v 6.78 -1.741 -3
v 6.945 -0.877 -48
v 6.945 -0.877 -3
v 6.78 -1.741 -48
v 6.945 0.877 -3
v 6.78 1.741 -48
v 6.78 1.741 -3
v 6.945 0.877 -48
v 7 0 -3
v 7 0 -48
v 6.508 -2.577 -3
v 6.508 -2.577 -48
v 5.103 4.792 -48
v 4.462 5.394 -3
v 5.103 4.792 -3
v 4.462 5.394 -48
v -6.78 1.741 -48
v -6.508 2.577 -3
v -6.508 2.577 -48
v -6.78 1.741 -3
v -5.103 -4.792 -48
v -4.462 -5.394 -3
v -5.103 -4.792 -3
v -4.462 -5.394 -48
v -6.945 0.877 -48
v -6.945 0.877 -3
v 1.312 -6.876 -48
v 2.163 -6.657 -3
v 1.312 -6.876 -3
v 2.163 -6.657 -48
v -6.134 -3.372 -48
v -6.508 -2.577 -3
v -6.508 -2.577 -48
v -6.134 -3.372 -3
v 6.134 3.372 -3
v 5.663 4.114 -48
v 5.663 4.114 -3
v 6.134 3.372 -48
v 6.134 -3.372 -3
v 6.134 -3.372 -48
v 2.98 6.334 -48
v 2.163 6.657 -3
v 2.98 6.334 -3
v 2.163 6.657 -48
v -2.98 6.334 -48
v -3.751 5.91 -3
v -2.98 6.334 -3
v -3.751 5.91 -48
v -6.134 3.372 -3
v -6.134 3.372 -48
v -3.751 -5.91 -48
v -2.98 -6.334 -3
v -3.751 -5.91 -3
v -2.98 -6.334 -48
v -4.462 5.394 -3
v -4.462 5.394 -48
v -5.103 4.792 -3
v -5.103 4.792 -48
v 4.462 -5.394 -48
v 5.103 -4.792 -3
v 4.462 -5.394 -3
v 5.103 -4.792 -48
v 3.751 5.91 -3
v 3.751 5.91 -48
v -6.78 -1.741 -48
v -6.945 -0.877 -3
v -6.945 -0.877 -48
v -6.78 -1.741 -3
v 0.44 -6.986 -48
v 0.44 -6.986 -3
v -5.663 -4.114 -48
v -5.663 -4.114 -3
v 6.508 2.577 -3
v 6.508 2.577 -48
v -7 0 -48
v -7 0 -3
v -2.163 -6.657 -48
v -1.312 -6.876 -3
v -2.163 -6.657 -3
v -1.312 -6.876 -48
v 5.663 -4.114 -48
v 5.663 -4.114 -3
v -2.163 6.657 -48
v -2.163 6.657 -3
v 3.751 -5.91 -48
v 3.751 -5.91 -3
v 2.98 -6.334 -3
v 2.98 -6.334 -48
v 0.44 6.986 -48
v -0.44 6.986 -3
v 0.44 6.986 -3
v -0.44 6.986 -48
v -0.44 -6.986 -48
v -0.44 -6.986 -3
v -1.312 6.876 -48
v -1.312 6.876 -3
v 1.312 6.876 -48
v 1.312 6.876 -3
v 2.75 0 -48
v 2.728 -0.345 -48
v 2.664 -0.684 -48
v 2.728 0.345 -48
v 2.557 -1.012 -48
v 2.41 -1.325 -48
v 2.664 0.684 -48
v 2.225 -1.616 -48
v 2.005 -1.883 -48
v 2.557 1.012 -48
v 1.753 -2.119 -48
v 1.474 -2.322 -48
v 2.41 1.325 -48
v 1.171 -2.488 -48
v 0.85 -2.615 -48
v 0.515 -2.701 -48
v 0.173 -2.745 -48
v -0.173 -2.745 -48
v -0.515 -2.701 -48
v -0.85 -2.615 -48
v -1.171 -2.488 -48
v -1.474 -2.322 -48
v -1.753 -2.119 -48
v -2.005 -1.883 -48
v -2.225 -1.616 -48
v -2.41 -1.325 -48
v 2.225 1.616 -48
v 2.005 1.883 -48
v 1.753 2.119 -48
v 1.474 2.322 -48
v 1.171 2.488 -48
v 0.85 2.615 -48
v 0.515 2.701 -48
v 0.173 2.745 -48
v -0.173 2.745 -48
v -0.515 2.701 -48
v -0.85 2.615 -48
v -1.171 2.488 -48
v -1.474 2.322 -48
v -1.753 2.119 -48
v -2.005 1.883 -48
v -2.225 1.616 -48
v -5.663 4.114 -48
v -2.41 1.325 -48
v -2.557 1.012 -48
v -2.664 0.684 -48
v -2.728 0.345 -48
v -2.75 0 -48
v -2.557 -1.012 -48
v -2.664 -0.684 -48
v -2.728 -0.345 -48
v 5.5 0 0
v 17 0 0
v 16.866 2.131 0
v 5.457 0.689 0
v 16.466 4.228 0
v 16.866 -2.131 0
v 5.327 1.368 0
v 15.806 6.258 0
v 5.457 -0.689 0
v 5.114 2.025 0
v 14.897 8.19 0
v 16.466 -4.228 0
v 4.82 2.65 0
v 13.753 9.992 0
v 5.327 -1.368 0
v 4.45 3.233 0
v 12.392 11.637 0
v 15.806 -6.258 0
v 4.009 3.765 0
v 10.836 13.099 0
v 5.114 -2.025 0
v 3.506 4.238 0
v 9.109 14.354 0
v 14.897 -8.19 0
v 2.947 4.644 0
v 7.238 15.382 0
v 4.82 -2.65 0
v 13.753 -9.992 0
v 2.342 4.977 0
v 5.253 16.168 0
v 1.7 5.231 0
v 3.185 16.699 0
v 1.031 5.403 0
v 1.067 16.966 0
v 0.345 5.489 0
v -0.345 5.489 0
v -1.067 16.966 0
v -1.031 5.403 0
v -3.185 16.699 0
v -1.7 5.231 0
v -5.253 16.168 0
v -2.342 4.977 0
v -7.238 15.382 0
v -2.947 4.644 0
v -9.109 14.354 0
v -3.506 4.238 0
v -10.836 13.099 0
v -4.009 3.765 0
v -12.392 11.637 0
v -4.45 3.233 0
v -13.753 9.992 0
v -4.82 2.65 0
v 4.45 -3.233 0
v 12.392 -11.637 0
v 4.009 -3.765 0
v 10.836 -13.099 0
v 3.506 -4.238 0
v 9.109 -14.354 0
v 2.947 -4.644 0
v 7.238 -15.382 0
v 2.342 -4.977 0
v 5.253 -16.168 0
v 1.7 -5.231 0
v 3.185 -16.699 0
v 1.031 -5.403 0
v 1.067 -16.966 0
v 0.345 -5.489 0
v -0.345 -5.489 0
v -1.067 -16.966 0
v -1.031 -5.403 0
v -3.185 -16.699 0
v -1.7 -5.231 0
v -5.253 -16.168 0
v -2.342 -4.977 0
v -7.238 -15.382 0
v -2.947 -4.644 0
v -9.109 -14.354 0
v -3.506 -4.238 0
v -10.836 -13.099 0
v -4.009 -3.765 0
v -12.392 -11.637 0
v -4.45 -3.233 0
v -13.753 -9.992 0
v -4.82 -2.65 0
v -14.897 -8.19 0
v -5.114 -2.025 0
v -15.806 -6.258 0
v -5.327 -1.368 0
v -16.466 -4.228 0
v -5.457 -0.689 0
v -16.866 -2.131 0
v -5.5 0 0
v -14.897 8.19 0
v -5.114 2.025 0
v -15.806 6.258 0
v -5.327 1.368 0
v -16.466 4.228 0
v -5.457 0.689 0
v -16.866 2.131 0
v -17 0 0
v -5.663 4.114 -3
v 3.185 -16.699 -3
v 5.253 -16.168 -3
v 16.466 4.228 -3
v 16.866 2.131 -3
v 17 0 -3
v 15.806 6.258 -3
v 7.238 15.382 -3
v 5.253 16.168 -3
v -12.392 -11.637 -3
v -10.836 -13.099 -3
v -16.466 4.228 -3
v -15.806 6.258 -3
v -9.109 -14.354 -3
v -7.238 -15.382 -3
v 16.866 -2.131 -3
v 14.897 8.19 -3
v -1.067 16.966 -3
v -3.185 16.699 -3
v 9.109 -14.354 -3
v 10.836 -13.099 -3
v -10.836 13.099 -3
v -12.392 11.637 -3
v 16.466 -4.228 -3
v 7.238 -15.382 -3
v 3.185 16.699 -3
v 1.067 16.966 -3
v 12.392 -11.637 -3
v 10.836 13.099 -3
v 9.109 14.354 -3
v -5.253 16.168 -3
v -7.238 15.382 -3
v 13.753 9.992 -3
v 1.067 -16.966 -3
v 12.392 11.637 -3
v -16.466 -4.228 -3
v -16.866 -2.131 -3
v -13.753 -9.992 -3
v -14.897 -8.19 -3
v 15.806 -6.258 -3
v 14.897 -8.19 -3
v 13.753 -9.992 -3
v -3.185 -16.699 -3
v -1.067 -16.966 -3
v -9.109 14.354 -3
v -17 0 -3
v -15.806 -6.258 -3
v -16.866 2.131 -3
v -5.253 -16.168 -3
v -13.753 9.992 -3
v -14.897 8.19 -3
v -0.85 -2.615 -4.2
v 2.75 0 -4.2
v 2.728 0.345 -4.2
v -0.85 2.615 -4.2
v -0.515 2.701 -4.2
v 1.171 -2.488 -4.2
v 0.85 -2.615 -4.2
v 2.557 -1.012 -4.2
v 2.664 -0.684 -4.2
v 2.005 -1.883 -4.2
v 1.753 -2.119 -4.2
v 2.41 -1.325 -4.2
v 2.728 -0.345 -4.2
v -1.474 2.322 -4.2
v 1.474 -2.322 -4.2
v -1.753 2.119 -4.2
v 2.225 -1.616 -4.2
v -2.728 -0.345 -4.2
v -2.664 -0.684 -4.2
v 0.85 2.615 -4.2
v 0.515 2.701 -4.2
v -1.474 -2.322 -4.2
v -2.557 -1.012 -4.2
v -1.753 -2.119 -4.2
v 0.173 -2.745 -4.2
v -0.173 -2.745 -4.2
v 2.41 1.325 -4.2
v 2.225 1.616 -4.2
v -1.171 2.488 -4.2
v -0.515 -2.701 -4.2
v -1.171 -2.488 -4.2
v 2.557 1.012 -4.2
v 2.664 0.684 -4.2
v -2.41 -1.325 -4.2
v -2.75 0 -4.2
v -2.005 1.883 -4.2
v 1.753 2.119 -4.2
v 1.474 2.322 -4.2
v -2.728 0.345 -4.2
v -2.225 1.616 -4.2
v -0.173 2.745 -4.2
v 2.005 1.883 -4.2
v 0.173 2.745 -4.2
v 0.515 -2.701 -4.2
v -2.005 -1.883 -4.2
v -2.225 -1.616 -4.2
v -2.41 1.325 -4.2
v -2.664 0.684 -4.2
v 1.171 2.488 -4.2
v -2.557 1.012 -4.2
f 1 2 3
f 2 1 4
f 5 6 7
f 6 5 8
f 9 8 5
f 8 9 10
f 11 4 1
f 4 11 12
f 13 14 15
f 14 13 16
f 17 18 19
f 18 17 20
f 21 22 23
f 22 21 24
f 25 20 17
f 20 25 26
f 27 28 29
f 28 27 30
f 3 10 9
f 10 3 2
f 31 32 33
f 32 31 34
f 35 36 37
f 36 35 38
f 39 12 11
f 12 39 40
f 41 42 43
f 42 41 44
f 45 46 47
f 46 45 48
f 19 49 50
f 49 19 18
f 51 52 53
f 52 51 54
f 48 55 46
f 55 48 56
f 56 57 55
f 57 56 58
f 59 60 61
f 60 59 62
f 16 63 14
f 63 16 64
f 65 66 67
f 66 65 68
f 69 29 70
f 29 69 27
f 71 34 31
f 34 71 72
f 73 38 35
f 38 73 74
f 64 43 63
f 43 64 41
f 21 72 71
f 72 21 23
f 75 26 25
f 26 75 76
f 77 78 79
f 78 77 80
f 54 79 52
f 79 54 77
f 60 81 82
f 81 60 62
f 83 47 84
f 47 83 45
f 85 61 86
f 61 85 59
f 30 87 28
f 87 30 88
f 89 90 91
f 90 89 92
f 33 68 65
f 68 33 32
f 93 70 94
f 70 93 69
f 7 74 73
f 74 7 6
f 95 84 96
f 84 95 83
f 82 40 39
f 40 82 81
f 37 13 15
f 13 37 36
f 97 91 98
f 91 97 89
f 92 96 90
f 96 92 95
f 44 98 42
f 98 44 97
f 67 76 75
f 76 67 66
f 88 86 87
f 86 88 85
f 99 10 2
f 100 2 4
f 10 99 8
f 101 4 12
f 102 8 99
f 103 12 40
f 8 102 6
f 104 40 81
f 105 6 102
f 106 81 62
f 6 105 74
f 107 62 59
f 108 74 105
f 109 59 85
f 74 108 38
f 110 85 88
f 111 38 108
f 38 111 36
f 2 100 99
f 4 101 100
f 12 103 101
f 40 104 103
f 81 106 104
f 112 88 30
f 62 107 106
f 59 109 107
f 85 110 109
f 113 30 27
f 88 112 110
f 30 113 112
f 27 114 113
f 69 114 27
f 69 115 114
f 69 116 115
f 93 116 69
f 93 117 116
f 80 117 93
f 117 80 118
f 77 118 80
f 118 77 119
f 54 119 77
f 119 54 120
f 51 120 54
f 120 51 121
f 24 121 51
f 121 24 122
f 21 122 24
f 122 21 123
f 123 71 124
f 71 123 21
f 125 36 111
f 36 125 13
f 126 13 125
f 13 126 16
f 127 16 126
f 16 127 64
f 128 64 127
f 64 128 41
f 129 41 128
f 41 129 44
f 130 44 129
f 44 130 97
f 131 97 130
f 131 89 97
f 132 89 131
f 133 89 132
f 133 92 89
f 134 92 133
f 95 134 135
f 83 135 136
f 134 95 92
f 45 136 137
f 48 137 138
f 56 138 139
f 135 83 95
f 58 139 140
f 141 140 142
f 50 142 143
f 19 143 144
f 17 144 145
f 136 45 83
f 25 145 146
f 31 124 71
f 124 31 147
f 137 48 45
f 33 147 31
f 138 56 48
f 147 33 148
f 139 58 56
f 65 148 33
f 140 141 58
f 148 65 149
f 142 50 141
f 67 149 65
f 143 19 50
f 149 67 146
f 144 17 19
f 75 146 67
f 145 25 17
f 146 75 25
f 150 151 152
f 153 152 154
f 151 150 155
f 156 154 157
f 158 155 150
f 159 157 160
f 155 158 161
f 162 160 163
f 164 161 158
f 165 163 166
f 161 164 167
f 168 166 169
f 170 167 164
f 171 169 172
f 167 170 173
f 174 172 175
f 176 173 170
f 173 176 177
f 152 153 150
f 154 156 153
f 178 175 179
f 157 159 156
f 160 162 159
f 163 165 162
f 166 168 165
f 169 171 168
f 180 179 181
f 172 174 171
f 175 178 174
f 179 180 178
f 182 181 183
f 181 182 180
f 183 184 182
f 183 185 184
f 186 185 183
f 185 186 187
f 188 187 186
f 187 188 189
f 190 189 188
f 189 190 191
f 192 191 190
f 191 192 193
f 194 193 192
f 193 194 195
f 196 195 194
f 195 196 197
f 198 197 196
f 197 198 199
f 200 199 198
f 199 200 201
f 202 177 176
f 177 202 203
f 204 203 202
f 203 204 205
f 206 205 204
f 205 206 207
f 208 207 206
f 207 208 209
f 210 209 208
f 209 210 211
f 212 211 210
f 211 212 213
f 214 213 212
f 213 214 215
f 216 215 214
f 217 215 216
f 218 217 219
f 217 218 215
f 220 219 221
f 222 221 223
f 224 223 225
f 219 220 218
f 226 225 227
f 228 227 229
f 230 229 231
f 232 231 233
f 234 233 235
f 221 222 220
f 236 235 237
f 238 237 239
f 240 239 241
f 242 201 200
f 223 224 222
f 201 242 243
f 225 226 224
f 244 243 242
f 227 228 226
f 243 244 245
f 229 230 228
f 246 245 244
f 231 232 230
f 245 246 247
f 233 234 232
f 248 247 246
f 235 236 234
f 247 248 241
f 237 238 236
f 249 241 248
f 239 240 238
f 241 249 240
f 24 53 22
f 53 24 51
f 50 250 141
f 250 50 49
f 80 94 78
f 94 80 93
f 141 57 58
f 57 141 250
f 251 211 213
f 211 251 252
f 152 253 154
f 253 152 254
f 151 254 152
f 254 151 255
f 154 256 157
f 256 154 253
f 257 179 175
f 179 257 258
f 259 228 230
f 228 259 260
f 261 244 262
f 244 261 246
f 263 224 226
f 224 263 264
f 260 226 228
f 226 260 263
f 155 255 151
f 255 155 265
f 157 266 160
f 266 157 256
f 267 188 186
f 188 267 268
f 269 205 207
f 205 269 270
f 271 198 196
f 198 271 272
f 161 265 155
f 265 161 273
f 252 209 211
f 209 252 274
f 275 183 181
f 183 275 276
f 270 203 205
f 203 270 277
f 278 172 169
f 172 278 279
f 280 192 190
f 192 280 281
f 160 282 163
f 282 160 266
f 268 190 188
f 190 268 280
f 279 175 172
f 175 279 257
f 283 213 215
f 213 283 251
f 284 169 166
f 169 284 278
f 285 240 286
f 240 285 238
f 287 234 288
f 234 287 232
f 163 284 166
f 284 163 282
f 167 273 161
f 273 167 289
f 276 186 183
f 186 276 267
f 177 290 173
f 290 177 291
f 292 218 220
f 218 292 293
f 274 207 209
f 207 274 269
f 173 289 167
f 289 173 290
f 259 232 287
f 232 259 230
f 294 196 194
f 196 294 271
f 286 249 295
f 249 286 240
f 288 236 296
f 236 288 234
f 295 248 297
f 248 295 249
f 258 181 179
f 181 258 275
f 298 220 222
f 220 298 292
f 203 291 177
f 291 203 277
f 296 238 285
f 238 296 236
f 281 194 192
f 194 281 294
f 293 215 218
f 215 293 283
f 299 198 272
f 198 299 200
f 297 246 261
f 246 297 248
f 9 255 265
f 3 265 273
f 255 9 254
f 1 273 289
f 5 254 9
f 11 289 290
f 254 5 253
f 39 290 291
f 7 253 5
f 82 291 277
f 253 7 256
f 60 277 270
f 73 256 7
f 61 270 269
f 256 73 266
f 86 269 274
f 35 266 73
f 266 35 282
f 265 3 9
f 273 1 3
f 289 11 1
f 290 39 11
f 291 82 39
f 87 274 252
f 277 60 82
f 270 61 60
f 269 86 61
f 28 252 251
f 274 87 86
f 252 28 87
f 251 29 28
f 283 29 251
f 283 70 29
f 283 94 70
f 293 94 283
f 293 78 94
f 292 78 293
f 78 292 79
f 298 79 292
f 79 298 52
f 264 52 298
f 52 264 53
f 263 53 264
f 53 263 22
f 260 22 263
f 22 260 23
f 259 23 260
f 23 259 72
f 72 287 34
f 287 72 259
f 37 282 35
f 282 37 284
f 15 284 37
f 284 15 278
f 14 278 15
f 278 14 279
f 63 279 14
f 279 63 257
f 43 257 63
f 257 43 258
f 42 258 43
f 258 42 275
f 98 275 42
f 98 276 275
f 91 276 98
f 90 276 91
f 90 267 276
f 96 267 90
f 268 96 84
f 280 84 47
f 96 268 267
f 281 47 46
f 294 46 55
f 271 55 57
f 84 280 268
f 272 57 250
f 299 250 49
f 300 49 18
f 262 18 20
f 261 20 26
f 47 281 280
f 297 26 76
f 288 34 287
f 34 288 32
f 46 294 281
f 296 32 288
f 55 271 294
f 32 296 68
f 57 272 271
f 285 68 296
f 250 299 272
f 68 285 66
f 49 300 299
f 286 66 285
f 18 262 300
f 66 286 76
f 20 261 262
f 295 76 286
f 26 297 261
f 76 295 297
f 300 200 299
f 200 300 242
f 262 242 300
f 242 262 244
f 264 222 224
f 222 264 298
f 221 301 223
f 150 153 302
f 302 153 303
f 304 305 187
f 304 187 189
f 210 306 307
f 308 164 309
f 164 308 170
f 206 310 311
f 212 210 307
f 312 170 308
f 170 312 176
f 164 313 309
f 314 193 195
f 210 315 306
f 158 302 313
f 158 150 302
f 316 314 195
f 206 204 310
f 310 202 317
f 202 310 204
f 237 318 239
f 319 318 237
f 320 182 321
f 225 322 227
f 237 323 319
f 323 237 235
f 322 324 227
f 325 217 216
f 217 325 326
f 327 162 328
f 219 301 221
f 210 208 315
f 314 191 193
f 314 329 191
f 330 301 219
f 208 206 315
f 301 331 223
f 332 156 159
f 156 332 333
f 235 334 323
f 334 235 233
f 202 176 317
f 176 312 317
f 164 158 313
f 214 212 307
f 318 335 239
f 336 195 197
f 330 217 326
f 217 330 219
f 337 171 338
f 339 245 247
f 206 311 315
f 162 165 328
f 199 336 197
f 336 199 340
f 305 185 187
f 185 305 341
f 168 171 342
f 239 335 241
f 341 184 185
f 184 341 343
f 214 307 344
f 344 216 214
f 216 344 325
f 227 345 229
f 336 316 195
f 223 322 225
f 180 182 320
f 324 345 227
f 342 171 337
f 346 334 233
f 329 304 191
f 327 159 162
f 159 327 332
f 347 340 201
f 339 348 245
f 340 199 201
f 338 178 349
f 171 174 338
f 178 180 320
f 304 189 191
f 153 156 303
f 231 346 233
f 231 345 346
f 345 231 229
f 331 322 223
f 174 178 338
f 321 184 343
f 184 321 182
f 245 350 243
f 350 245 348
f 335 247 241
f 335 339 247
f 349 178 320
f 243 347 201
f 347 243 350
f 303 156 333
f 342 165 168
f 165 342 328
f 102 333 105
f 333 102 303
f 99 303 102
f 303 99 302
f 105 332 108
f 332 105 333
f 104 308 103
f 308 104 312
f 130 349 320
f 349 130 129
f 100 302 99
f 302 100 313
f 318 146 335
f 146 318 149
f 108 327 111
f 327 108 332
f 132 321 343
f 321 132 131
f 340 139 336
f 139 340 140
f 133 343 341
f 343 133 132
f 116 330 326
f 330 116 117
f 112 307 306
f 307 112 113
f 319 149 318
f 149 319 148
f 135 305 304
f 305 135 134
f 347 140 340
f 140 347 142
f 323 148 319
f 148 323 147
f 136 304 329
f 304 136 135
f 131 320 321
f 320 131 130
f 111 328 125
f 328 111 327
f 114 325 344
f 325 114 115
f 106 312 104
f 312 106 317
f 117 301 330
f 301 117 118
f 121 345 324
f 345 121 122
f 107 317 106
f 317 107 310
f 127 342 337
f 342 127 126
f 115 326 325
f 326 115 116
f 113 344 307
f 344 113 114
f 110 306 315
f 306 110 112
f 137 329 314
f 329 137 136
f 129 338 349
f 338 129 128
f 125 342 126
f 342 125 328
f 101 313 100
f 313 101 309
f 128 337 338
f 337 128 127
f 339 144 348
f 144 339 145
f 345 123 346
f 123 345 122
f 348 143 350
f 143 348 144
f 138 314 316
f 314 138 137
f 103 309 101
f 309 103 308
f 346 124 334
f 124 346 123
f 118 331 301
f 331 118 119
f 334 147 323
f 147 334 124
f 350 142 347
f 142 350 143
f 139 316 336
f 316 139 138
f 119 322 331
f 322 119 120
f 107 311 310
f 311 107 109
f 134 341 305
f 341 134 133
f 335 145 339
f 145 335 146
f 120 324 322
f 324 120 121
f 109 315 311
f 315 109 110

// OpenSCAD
$fn = 50;


difference() {
	union() {
		translate(v = [0, 0, -48.0000000000]) {
			cylinder(h = 48, r = 7.0000000000);
		}
		translate(v = [0, 0, -3.0000000000]) {
			cylinder(h = 3, r = 17.0000000000);
		}
	}
	union() {
		translate(v = [0, 0, 0]) {
			rotate(a = [0, 0, 0]) {
				difference() {
					union() {
						#translate(v = [0, 0, -48.0000000000]) {
							cylinder(h = 48, r = 2.2500000000);
						}
						#translate(v = [0, 0, -4.2000000000]) {
							cylinder(h = 4.2000000000, r = 7.0000000000, r1 = 2.7500000000, r2 = 5.5000000000);
						}
						#translate(v = [0, 0, -48.0000000000]) {
							cylinder(h = 48, r = 2.7500000000);
						}
						#translate(v = [0, 0, -48.0000000000]) {
							cylinder(h = 48, r = 2.2500000000);
						}
					}
					union();
				}
			}
		}
	}
}
